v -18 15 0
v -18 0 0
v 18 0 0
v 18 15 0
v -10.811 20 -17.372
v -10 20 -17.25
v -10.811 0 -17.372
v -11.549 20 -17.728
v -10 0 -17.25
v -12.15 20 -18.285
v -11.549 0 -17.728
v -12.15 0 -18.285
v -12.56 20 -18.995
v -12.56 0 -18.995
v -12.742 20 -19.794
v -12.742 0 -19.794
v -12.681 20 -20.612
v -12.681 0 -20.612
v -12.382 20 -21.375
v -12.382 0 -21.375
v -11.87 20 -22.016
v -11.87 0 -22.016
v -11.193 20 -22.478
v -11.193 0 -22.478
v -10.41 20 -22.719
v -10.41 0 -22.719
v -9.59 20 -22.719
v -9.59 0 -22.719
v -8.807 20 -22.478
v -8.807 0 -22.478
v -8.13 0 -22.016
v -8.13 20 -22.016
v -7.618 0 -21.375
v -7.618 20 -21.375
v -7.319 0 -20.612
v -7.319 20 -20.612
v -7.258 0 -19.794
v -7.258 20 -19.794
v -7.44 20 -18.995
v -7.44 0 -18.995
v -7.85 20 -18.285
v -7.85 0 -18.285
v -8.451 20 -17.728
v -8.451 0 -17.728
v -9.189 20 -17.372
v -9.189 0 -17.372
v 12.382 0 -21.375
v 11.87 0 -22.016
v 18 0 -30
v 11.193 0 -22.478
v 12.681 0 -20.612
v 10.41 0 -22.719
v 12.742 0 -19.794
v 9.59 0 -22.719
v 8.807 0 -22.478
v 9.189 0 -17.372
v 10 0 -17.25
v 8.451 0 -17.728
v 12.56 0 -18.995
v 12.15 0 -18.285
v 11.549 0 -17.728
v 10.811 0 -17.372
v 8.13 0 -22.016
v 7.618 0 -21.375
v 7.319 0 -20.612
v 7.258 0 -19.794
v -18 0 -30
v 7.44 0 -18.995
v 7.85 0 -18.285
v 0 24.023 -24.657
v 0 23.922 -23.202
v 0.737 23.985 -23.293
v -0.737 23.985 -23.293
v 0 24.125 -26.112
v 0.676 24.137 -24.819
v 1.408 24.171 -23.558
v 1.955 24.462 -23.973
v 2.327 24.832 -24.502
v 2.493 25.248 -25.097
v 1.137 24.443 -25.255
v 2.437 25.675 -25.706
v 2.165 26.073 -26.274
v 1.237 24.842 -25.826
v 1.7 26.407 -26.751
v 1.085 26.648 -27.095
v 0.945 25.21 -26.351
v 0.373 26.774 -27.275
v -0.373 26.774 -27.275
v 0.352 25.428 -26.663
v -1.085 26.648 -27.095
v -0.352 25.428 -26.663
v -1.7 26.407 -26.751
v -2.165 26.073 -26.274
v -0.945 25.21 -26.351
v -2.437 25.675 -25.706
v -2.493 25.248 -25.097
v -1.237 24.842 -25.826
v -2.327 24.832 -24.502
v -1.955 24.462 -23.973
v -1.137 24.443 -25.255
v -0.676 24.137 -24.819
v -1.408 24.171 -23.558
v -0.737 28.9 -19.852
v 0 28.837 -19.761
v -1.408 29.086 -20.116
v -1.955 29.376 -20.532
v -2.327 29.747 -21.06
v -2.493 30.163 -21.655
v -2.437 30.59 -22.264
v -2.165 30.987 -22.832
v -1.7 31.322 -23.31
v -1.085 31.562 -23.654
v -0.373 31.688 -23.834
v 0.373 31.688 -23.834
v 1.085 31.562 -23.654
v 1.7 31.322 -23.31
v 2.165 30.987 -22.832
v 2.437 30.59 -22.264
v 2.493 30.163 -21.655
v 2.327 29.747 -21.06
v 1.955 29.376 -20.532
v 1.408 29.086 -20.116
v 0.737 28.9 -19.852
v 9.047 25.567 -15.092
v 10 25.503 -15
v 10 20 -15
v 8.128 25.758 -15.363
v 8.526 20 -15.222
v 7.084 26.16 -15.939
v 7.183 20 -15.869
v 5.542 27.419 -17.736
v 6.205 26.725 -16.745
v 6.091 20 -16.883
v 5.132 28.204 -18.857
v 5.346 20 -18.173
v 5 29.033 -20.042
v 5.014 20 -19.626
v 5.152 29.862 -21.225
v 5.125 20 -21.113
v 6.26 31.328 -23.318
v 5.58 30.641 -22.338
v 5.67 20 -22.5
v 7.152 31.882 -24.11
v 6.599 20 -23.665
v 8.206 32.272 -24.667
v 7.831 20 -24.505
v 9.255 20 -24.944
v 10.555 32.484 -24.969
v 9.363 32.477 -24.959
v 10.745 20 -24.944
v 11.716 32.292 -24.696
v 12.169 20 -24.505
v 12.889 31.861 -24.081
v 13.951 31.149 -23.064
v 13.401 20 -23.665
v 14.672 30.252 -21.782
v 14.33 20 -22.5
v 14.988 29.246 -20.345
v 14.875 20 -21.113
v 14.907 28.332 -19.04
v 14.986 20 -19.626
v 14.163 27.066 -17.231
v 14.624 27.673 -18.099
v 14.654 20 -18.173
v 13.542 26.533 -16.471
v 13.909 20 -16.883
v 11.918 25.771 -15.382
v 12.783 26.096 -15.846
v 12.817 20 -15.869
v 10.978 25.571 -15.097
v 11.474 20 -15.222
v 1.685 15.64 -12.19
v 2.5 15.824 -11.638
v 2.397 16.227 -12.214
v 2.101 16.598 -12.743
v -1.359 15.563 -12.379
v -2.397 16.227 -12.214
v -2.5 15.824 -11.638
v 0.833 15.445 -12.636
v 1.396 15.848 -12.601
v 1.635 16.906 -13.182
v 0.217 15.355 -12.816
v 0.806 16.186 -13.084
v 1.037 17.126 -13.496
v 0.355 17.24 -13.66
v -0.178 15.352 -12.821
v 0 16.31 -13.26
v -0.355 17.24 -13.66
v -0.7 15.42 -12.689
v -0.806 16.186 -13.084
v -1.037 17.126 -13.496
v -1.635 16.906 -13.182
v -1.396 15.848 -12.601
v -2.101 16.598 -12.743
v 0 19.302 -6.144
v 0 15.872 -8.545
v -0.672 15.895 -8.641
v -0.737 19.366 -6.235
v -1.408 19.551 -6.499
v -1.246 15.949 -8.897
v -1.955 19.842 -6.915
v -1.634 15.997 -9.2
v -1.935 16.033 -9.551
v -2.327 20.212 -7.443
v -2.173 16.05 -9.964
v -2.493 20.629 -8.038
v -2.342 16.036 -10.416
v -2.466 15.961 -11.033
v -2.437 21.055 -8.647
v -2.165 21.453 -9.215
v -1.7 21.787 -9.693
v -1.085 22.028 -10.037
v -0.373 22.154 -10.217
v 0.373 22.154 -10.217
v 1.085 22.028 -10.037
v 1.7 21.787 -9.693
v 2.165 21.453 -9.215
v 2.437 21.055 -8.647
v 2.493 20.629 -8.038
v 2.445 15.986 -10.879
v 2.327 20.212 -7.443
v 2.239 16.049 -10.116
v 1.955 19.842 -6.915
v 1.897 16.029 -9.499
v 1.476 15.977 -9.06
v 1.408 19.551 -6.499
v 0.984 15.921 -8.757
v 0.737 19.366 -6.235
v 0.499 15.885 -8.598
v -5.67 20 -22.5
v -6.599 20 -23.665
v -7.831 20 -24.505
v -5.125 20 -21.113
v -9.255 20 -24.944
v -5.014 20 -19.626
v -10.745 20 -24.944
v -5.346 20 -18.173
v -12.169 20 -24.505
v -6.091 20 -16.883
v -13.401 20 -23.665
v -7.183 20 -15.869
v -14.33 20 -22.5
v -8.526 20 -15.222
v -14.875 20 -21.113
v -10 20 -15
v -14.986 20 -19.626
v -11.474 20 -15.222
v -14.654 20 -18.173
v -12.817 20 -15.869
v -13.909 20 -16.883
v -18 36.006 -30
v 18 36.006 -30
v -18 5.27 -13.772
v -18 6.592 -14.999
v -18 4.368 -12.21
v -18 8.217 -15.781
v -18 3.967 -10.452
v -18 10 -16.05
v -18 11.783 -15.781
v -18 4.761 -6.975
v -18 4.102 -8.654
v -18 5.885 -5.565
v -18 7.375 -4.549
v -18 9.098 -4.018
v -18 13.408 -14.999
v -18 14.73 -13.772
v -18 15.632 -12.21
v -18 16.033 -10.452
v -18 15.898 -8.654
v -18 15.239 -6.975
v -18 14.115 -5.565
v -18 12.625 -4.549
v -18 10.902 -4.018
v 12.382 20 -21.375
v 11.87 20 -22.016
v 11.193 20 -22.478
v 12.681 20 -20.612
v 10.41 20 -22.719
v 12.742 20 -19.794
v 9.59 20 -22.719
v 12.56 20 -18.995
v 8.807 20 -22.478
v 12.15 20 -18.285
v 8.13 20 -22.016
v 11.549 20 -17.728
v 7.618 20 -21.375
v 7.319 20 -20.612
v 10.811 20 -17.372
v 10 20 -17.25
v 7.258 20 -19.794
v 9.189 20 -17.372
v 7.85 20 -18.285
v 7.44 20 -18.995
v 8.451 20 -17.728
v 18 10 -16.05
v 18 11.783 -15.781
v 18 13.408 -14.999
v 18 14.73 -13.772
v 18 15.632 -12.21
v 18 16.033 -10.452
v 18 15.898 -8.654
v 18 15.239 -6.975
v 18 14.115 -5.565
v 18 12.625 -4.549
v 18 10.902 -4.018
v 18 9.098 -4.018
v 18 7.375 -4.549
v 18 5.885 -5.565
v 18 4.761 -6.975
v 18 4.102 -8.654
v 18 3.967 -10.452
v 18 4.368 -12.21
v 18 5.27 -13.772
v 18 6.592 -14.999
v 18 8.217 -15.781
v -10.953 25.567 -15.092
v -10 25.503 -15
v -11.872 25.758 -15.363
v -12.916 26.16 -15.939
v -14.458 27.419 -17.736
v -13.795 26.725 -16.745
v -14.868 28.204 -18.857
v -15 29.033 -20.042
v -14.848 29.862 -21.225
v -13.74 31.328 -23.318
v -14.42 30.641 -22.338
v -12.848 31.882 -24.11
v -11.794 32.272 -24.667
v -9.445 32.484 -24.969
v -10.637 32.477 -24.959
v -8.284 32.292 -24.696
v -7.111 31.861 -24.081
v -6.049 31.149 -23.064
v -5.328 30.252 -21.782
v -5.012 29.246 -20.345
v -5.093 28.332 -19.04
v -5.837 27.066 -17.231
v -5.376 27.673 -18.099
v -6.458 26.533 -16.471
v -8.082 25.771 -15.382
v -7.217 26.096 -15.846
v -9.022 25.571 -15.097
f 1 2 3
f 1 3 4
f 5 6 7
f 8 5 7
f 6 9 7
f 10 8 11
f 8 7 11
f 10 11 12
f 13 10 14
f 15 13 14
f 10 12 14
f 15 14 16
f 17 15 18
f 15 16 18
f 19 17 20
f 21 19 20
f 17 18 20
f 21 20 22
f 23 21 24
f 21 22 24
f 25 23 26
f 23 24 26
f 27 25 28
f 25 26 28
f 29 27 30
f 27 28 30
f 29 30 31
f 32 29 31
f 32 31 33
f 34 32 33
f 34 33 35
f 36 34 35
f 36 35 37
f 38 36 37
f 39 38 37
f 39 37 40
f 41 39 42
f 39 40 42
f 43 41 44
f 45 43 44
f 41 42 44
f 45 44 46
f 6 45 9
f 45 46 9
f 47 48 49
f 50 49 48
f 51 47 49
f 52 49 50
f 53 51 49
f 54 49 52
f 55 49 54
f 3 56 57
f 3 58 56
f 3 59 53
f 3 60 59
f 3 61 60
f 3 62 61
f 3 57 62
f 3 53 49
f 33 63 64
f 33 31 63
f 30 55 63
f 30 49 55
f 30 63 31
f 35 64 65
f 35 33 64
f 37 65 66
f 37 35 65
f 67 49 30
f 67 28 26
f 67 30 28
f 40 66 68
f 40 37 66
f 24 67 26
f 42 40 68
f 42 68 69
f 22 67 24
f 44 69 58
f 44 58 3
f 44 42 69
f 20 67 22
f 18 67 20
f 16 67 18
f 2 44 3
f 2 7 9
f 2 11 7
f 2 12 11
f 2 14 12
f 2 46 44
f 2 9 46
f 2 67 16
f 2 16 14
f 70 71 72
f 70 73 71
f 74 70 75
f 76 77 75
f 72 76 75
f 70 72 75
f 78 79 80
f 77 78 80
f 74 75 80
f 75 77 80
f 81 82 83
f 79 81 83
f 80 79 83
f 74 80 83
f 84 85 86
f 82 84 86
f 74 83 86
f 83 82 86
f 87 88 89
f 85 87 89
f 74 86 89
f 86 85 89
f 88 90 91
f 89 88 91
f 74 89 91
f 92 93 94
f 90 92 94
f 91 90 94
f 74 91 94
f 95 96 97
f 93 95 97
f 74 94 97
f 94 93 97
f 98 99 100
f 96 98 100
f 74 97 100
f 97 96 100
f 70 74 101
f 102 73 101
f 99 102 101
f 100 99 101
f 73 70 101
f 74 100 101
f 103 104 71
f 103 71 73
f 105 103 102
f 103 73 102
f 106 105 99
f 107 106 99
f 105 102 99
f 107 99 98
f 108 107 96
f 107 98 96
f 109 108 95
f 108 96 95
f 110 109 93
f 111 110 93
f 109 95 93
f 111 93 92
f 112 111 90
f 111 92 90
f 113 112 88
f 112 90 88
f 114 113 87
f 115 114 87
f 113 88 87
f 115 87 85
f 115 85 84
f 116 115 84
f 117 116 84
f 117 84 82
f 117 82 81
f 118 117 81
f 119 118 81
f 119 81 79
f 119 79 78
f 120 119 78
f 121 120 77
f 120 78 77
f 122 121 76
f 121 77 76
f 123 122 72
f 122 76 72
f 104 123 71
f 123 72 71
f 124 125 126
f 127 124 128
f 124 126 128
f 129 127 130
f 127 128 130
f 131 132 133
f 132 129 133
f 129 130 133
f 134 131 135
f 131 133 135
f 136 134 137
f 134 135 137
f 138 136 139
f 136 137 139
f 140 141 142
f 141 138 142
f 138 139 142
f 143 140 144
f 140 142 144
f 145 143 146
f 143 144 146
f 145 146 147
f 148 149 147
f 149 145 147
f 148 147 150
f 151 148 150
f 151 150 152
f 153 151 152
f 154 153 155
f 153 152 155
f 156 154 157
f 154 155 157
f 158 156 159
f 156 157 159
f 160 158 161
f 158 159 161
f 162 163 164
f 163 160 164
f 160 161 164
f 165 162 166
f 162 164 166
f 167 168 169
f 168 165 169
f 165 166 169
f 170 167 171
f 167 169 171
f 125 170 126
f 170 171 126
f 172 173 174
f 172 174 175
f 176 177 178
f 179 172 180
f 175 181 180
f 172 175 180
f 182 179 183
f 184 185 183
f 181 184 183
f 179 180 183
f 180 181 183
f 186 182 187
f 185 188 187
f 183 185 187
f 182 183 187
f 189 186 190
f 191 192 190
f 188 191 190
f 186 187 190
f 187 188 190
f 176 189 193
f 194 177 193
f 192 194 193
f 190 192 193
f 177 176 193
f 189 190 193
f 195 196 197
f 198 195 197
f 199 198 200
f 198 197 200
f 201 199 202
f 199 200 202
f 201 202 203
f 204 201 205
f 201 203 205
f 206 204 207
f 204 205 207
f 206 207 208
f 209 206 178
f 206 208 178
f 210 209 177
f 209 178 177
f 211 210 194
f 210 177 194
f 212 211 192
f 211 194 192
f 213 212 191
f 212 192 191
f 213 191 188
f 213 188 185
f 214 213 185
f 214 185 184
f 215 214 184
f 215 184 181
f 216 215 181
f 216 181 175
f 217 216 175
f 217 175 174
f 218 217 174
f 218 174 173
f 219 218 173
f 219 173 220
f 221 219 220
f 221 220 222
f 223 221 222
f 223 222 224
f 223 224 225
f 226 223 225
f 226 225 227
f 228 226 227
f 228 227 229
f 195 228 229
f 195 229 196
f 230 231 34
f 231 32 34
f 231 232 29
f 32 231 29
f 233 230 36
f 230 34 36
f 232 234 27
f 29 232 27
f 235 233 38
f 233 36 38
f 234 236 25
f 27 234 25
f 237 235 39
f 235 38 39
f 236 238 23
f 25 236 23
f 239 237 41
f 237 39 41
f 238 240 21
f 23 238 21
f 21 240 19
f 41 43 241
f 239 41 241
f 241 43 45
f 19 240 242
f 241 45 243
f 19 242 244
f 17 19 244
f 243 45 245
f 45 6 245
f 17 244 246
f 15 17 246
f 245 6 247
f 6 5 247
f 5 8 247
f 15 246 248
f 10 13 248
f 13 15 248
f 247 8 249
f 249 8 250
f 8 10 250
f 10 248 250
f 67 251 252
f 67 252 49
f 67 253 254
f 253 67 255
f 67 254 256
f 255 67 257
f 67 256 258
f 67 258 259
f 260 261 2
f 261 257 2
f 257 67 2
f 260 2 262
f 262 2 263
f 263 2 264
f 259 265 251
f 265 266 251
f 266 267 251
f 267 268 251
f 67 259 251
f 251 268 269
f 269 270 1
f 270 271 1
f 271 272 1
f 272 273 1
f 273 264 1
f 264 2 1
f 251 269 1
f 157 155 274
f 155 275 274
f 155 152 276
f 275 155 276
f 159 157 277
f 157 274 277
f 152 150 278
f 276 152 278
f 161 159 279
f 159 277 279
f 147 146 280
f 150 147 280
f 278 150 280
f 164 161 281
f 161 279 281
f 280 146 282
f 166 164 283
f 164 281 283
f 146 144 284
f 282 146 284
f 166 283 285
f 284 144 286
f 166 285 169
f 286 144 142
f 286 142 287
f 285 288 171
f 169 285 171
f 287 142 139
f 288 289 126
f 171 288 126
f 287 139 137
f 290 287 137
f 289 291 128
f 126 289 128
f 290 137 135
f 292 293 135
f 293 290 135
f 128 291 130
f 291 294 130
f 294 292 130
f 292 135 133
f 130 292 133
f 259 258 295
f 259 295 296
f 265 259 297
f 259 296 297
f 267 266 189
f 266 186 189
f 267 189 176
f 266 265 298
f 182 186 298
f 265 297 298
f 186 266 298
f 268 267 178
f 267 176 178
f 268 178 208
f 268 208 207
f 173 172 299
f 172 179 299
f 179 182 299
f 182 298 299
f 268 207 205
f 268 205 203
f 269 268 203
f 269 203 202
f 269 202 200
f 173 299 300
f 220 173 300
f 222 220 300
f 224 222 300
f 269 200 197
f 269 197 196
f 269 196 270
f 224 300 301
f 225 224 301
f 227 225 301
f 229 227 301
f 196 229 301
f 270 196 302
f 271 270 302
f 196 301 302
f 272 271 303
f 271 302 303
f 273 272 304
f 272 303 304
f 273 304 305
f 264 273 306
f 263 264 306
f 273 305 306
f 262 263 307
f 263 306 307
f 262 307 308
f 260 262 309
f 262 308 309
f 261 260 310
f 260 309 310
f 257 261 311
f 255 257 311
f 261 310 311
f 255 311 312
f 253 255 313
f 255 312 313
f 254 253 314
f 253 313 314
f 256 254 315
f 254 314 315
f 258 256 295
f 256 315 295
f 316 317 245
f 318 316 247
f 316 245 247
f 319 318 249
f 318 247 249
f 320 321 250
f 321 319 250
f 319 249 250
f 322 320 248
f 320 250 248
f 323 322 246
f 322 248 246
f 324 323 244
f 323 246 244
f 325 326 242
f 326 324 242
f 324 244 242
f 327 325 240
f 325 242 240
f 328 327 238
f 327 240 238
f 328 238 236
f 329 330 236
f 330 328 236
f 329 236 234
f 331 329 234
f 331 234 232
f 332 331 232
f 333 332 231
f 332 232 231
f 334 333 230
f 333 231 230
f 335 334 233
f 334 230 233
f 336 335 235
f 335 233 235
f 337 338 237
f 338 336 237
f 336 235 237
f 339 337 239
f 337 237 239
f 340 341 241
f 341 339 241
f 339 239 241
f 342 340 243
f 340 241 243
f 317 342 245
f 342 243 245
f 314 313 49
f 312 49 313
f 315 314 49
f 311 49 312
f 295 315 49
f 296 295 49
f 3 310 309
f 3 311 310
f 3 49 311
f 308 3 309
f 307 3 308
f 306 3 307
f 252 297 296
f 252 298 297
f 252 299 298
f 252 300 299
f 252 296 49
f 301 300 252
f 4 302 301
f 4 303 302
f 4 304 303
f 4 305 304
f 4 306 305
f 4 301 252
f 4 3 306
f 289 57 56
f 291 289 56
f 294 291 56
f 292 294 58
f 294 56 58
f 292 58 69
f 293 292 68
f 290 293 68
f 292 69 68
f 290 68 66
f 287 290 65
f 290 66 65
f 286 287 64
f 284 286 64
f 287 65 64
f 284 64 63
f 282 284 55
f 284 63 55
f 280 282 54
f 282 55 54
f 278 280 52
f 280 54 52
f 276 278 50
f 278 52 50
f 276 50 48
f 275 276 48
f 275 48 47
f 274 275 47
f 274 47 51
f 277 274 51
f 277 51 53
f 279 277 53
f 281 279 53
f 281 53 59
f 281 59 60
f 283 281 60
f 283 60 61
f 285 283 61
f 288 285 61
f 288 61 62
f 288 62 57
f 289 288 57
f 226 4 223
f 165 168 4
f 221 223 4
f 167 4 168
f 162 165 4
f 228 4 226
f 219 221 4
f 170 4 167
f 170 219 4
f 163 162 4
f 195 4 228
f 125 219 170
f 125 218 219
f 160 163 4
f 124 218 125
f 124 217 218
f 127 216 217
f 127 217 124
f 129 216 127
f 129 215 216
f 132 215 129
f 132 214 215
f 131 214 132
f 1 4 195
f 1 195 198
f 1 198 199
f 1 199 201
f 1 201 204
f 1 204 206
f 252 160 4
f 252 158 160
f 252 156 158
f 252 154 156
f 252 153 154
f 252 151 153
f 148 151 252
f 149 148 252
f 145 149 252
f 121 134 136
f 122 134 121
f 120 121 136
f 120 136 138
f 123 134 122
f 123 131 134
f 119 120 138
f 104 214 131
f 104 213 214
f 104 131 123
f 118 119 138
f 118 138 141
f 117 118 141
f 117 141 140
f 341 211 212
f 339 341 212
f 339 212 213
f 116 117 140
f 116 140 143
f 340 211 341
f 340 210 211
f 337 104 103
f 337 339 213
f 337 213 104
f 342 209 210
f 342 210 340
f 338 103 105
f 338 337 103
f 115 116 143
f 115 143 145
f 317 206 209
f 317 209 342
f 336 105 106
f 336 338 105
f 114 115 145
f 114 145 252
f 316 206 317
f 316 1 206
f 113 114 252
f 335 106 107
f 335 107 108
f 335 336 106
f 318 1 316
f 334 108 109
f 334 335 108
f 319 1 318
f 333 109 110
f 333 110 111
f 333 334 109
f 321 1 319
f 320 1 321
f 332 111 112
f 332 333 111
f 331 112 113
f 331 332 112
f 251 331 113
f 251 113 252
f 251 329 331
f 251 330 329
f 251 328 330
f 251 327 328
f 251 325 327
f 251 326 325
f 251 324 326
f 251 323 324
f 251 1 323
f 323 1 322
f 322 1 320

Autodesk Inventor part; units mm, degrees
ref_plane "YZ Plane" through (0, 0, 0) normal (1, 0, 0) x (0, 1, 0)
ref_plane "XZ Plane" through (0, 0, 0) normal (0, 1, 0) x (-1, 0, 0)
sketch "スケッチ1" plane through (0, 0, 0) normal (1, 0, 0) x (0, 1, 0)
  line L0 (0, 0) -> (15, 0)
  line L1 (15, 0) -> (36.0062, -30)
  line L2 (36.0062, -30) -> (0, -30)
  line L3 (0, -30) -> (0, 0)
  dimension "d0" = 35
  dimension "d1" = 15
  dimension "d2" = 30
extrude "押し出し1" add sketch "スケッチ1" along normal mid plane 36
ref_plane "作業平面1" through (-18, 50, -30) normal (0, -1, 0) x (1, 0, 0)
sketch "スケッチ3" plane through (-18, 50, -30) normal (0, -1, 0) x (1, 0, 0)
  line L0 (0, 0) -> (36, 0) projected
  line L1 (0, 30) -> (0, 0) projected
  line L2 (36, 0) -> (36, 30) projected
  point P0 (18, 30)
  point P1 (8, 10)
  point P2 (28, 10)
  dimension "d11" = 10
  dimension "d12" = 8
  dimension "d13" = 8
  dimension "d14" = 10
hole "穴1" at (-10, 50, -20) at (10, 50, -20) direction (0, -1, 0) diameter 5.5 end through all counterbore diameter 10 counterbore depth 30 clearance for "Socket Head Cap Screw" size "M5" standard "Ansi Metric M Profile"
sketch "スケッチ4" plane through (-18, 15, 0) normal (0, 0.8192, 0.5736) x (1, 0, 0)
  line L0 (18, 10) -> (18, 10)
  line L1 (18, 10) -> (18, 26.6232)
  line L2 (18, 26.6232) -> (18, 26.6232)
  line L3 (18, 26.6232) -> (18, 10)
  line L4 (0, 36.6232) -> (36, 36.6232) projected
  line L5 (0, 0) -> (36, 0) projected
  line L6 (0, 0) -> (0, 36.6232) projected
  line L7 (36, 36.6232) -> (36, 0) projected
  point P0 (18, -8.6036)
  dimension "d22" = 36.6232
  dimension "d24" = 10
  dimension "d36" = 10
  dimension "d46" = 18
  dimension "d47" = 18
  dimension "d51" = 36
hole "穴2" at (0, 30.2705, -21.8085) at (0, 20.7358, -8.1915) at (0, 30.2705, -21.8085) at (0, 20.7358, -8.1915) direction (0, -0.8192, -0.5736) diameter 5 depth 6 tip angle 118
sketch "スケッチ5" plane through (18, 0, 0) normal (1, 0, 0) x (0, 0, -1)
  circle A0 centre (10, 10) radius 6.05
  line L0 (0, 0) -> (30, 0) projected
  line L1 (0, 15) -> (0, 0) projected
  dimension "d40" = 10
  dimension "d41" = 10
  dimension "d42" = 12.1
extrude "押し出し3" cut sketch "スケッチ5" against normal through all
equation "\"d13\" = d12"
equation "\"d14\" = d11"
equation "\"d46\" = 0.5 * d51"
equation "\"d47\" = d46"
properties part number "s_base1"
